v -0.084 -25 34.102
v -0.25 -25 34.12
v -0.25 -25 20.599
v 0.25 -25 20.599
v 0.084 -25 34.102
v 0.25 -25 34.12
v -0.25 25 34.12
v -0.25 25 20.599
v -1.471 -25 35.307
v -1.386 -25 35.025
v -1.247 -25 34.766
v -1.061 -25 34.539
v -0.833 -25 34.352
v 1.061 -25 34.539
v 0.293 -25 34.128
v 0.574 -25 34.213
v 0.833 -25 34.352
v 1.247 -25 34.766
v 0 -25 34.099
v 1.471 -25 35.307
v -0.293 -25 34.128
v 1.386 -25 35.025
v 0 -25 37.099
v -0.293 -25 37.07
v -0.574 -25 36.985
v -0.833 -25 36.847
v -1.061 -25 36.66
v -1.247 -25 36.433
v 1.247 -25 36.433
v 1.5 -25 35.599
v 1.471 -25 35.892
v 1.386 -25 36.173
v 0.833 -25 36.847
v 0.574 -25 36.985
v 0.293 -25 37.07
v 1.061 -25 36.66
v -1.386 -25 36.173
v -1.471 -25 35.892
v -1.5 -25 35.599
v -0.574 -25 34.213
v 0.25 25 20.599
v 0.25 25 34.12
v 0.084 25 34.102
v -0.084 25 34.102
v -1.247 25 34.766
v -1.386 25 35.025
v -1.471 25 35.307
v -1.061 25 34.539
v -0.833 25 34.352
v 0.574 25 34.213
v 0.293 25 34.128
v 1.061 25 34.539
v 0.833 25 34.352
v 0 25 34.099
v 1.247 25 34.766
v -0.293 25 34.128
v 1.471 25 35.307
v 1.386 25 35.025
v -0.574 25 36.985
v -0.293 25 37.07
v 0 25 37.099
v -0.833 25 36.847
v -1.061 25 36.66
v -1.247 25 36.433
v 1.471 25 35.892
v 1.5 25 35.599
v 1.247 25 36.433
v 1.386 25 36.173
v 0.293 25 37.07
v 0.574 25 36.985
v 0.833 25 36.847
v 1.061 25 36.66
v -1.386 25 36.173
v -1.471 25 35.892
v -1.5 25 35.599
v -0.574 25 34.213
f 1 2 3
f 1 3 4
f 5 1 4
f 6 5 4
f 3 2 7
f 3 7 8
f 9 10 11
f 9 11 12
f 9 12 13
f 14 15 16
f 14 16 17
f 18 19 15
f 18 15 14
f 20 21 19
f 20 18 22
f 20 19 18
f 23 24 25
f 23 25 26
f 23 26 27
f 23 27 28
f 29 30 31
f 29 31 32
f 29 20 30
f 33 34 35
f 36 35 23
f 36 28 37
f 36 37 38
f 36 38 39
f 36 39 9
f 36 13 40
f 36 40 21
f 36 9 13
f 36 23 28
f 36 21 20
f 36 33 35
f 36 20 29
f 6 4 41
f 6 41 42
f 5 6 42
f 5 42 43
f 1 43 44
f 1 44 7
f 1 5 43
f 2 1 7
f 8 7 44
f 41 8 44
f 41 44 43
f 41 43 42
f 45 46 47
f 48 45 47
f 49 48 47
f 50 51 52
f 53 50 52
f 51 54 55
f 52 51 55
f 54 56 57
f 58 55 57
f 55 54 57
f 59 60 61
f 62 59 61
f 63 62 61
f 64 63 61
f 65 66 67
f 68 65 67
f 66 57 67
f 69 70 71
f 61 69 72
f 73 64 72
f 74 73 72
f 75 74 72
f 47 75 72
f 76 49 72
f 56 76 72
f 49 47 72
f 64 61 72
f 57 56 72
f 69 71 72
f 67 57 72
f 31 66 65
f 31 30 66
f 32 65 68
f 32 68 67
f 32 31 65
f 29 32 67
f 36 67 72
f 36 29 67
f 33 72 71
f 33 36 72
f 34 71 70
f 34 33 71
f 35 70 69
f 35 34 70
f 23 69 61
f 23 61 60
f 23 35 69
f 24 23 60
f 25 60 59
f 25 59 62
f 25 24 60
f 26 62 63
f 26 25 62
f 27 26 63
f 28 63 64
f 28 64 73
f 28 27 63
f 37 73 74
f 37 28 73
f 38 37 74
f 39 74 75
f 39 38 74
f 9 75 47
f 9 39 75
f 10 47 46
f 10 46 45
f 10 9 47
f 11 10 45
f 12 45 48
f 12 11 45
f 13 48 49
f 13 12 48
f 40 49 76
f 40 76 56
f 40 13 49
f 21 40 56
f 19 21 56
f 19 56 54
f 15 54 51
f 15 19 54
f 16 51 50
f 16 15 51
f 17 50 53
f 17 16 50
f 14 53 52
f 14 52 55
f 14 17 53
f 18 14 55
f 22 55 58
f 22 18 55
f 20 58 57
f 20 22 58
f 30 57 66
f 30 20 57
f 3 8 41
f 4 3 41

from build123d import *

# Parameters (mm, degrees)
F0_R     = 1.5
F1_DEPTH = 25
F3_DEPTH = 50


with BuildPart() as f1:
    # F0 (on Front) → F1 (new body, symmetric)
    with BuildSketch(Plane.XZ):
        with Locations((0, 35.599317)):
            Circle(F0_R)
    extrude(amount=F1_DEPTH, both=True)


with BuildPart() as f3:
    # F2 (on face) → F3 (new body)
    with BuildSketch(Plane.XZ.offset(25)):
        with BuildLine():
            Line((0.25, 20.599317), (0.25, 34.120297))
            ThreePointArc((0.25, 34.120297), (0, 34.099317), (-0.25, 34.120297))
            Line((-0.25, 34.120297), (-0.25, 20.599317))
            Line((-0.25, 20.599317), (0.25, 20.599317))
        make_face()
    extrude(amount=-F3_DEPTH)


solid = Compound([f1.part, f3.part])
